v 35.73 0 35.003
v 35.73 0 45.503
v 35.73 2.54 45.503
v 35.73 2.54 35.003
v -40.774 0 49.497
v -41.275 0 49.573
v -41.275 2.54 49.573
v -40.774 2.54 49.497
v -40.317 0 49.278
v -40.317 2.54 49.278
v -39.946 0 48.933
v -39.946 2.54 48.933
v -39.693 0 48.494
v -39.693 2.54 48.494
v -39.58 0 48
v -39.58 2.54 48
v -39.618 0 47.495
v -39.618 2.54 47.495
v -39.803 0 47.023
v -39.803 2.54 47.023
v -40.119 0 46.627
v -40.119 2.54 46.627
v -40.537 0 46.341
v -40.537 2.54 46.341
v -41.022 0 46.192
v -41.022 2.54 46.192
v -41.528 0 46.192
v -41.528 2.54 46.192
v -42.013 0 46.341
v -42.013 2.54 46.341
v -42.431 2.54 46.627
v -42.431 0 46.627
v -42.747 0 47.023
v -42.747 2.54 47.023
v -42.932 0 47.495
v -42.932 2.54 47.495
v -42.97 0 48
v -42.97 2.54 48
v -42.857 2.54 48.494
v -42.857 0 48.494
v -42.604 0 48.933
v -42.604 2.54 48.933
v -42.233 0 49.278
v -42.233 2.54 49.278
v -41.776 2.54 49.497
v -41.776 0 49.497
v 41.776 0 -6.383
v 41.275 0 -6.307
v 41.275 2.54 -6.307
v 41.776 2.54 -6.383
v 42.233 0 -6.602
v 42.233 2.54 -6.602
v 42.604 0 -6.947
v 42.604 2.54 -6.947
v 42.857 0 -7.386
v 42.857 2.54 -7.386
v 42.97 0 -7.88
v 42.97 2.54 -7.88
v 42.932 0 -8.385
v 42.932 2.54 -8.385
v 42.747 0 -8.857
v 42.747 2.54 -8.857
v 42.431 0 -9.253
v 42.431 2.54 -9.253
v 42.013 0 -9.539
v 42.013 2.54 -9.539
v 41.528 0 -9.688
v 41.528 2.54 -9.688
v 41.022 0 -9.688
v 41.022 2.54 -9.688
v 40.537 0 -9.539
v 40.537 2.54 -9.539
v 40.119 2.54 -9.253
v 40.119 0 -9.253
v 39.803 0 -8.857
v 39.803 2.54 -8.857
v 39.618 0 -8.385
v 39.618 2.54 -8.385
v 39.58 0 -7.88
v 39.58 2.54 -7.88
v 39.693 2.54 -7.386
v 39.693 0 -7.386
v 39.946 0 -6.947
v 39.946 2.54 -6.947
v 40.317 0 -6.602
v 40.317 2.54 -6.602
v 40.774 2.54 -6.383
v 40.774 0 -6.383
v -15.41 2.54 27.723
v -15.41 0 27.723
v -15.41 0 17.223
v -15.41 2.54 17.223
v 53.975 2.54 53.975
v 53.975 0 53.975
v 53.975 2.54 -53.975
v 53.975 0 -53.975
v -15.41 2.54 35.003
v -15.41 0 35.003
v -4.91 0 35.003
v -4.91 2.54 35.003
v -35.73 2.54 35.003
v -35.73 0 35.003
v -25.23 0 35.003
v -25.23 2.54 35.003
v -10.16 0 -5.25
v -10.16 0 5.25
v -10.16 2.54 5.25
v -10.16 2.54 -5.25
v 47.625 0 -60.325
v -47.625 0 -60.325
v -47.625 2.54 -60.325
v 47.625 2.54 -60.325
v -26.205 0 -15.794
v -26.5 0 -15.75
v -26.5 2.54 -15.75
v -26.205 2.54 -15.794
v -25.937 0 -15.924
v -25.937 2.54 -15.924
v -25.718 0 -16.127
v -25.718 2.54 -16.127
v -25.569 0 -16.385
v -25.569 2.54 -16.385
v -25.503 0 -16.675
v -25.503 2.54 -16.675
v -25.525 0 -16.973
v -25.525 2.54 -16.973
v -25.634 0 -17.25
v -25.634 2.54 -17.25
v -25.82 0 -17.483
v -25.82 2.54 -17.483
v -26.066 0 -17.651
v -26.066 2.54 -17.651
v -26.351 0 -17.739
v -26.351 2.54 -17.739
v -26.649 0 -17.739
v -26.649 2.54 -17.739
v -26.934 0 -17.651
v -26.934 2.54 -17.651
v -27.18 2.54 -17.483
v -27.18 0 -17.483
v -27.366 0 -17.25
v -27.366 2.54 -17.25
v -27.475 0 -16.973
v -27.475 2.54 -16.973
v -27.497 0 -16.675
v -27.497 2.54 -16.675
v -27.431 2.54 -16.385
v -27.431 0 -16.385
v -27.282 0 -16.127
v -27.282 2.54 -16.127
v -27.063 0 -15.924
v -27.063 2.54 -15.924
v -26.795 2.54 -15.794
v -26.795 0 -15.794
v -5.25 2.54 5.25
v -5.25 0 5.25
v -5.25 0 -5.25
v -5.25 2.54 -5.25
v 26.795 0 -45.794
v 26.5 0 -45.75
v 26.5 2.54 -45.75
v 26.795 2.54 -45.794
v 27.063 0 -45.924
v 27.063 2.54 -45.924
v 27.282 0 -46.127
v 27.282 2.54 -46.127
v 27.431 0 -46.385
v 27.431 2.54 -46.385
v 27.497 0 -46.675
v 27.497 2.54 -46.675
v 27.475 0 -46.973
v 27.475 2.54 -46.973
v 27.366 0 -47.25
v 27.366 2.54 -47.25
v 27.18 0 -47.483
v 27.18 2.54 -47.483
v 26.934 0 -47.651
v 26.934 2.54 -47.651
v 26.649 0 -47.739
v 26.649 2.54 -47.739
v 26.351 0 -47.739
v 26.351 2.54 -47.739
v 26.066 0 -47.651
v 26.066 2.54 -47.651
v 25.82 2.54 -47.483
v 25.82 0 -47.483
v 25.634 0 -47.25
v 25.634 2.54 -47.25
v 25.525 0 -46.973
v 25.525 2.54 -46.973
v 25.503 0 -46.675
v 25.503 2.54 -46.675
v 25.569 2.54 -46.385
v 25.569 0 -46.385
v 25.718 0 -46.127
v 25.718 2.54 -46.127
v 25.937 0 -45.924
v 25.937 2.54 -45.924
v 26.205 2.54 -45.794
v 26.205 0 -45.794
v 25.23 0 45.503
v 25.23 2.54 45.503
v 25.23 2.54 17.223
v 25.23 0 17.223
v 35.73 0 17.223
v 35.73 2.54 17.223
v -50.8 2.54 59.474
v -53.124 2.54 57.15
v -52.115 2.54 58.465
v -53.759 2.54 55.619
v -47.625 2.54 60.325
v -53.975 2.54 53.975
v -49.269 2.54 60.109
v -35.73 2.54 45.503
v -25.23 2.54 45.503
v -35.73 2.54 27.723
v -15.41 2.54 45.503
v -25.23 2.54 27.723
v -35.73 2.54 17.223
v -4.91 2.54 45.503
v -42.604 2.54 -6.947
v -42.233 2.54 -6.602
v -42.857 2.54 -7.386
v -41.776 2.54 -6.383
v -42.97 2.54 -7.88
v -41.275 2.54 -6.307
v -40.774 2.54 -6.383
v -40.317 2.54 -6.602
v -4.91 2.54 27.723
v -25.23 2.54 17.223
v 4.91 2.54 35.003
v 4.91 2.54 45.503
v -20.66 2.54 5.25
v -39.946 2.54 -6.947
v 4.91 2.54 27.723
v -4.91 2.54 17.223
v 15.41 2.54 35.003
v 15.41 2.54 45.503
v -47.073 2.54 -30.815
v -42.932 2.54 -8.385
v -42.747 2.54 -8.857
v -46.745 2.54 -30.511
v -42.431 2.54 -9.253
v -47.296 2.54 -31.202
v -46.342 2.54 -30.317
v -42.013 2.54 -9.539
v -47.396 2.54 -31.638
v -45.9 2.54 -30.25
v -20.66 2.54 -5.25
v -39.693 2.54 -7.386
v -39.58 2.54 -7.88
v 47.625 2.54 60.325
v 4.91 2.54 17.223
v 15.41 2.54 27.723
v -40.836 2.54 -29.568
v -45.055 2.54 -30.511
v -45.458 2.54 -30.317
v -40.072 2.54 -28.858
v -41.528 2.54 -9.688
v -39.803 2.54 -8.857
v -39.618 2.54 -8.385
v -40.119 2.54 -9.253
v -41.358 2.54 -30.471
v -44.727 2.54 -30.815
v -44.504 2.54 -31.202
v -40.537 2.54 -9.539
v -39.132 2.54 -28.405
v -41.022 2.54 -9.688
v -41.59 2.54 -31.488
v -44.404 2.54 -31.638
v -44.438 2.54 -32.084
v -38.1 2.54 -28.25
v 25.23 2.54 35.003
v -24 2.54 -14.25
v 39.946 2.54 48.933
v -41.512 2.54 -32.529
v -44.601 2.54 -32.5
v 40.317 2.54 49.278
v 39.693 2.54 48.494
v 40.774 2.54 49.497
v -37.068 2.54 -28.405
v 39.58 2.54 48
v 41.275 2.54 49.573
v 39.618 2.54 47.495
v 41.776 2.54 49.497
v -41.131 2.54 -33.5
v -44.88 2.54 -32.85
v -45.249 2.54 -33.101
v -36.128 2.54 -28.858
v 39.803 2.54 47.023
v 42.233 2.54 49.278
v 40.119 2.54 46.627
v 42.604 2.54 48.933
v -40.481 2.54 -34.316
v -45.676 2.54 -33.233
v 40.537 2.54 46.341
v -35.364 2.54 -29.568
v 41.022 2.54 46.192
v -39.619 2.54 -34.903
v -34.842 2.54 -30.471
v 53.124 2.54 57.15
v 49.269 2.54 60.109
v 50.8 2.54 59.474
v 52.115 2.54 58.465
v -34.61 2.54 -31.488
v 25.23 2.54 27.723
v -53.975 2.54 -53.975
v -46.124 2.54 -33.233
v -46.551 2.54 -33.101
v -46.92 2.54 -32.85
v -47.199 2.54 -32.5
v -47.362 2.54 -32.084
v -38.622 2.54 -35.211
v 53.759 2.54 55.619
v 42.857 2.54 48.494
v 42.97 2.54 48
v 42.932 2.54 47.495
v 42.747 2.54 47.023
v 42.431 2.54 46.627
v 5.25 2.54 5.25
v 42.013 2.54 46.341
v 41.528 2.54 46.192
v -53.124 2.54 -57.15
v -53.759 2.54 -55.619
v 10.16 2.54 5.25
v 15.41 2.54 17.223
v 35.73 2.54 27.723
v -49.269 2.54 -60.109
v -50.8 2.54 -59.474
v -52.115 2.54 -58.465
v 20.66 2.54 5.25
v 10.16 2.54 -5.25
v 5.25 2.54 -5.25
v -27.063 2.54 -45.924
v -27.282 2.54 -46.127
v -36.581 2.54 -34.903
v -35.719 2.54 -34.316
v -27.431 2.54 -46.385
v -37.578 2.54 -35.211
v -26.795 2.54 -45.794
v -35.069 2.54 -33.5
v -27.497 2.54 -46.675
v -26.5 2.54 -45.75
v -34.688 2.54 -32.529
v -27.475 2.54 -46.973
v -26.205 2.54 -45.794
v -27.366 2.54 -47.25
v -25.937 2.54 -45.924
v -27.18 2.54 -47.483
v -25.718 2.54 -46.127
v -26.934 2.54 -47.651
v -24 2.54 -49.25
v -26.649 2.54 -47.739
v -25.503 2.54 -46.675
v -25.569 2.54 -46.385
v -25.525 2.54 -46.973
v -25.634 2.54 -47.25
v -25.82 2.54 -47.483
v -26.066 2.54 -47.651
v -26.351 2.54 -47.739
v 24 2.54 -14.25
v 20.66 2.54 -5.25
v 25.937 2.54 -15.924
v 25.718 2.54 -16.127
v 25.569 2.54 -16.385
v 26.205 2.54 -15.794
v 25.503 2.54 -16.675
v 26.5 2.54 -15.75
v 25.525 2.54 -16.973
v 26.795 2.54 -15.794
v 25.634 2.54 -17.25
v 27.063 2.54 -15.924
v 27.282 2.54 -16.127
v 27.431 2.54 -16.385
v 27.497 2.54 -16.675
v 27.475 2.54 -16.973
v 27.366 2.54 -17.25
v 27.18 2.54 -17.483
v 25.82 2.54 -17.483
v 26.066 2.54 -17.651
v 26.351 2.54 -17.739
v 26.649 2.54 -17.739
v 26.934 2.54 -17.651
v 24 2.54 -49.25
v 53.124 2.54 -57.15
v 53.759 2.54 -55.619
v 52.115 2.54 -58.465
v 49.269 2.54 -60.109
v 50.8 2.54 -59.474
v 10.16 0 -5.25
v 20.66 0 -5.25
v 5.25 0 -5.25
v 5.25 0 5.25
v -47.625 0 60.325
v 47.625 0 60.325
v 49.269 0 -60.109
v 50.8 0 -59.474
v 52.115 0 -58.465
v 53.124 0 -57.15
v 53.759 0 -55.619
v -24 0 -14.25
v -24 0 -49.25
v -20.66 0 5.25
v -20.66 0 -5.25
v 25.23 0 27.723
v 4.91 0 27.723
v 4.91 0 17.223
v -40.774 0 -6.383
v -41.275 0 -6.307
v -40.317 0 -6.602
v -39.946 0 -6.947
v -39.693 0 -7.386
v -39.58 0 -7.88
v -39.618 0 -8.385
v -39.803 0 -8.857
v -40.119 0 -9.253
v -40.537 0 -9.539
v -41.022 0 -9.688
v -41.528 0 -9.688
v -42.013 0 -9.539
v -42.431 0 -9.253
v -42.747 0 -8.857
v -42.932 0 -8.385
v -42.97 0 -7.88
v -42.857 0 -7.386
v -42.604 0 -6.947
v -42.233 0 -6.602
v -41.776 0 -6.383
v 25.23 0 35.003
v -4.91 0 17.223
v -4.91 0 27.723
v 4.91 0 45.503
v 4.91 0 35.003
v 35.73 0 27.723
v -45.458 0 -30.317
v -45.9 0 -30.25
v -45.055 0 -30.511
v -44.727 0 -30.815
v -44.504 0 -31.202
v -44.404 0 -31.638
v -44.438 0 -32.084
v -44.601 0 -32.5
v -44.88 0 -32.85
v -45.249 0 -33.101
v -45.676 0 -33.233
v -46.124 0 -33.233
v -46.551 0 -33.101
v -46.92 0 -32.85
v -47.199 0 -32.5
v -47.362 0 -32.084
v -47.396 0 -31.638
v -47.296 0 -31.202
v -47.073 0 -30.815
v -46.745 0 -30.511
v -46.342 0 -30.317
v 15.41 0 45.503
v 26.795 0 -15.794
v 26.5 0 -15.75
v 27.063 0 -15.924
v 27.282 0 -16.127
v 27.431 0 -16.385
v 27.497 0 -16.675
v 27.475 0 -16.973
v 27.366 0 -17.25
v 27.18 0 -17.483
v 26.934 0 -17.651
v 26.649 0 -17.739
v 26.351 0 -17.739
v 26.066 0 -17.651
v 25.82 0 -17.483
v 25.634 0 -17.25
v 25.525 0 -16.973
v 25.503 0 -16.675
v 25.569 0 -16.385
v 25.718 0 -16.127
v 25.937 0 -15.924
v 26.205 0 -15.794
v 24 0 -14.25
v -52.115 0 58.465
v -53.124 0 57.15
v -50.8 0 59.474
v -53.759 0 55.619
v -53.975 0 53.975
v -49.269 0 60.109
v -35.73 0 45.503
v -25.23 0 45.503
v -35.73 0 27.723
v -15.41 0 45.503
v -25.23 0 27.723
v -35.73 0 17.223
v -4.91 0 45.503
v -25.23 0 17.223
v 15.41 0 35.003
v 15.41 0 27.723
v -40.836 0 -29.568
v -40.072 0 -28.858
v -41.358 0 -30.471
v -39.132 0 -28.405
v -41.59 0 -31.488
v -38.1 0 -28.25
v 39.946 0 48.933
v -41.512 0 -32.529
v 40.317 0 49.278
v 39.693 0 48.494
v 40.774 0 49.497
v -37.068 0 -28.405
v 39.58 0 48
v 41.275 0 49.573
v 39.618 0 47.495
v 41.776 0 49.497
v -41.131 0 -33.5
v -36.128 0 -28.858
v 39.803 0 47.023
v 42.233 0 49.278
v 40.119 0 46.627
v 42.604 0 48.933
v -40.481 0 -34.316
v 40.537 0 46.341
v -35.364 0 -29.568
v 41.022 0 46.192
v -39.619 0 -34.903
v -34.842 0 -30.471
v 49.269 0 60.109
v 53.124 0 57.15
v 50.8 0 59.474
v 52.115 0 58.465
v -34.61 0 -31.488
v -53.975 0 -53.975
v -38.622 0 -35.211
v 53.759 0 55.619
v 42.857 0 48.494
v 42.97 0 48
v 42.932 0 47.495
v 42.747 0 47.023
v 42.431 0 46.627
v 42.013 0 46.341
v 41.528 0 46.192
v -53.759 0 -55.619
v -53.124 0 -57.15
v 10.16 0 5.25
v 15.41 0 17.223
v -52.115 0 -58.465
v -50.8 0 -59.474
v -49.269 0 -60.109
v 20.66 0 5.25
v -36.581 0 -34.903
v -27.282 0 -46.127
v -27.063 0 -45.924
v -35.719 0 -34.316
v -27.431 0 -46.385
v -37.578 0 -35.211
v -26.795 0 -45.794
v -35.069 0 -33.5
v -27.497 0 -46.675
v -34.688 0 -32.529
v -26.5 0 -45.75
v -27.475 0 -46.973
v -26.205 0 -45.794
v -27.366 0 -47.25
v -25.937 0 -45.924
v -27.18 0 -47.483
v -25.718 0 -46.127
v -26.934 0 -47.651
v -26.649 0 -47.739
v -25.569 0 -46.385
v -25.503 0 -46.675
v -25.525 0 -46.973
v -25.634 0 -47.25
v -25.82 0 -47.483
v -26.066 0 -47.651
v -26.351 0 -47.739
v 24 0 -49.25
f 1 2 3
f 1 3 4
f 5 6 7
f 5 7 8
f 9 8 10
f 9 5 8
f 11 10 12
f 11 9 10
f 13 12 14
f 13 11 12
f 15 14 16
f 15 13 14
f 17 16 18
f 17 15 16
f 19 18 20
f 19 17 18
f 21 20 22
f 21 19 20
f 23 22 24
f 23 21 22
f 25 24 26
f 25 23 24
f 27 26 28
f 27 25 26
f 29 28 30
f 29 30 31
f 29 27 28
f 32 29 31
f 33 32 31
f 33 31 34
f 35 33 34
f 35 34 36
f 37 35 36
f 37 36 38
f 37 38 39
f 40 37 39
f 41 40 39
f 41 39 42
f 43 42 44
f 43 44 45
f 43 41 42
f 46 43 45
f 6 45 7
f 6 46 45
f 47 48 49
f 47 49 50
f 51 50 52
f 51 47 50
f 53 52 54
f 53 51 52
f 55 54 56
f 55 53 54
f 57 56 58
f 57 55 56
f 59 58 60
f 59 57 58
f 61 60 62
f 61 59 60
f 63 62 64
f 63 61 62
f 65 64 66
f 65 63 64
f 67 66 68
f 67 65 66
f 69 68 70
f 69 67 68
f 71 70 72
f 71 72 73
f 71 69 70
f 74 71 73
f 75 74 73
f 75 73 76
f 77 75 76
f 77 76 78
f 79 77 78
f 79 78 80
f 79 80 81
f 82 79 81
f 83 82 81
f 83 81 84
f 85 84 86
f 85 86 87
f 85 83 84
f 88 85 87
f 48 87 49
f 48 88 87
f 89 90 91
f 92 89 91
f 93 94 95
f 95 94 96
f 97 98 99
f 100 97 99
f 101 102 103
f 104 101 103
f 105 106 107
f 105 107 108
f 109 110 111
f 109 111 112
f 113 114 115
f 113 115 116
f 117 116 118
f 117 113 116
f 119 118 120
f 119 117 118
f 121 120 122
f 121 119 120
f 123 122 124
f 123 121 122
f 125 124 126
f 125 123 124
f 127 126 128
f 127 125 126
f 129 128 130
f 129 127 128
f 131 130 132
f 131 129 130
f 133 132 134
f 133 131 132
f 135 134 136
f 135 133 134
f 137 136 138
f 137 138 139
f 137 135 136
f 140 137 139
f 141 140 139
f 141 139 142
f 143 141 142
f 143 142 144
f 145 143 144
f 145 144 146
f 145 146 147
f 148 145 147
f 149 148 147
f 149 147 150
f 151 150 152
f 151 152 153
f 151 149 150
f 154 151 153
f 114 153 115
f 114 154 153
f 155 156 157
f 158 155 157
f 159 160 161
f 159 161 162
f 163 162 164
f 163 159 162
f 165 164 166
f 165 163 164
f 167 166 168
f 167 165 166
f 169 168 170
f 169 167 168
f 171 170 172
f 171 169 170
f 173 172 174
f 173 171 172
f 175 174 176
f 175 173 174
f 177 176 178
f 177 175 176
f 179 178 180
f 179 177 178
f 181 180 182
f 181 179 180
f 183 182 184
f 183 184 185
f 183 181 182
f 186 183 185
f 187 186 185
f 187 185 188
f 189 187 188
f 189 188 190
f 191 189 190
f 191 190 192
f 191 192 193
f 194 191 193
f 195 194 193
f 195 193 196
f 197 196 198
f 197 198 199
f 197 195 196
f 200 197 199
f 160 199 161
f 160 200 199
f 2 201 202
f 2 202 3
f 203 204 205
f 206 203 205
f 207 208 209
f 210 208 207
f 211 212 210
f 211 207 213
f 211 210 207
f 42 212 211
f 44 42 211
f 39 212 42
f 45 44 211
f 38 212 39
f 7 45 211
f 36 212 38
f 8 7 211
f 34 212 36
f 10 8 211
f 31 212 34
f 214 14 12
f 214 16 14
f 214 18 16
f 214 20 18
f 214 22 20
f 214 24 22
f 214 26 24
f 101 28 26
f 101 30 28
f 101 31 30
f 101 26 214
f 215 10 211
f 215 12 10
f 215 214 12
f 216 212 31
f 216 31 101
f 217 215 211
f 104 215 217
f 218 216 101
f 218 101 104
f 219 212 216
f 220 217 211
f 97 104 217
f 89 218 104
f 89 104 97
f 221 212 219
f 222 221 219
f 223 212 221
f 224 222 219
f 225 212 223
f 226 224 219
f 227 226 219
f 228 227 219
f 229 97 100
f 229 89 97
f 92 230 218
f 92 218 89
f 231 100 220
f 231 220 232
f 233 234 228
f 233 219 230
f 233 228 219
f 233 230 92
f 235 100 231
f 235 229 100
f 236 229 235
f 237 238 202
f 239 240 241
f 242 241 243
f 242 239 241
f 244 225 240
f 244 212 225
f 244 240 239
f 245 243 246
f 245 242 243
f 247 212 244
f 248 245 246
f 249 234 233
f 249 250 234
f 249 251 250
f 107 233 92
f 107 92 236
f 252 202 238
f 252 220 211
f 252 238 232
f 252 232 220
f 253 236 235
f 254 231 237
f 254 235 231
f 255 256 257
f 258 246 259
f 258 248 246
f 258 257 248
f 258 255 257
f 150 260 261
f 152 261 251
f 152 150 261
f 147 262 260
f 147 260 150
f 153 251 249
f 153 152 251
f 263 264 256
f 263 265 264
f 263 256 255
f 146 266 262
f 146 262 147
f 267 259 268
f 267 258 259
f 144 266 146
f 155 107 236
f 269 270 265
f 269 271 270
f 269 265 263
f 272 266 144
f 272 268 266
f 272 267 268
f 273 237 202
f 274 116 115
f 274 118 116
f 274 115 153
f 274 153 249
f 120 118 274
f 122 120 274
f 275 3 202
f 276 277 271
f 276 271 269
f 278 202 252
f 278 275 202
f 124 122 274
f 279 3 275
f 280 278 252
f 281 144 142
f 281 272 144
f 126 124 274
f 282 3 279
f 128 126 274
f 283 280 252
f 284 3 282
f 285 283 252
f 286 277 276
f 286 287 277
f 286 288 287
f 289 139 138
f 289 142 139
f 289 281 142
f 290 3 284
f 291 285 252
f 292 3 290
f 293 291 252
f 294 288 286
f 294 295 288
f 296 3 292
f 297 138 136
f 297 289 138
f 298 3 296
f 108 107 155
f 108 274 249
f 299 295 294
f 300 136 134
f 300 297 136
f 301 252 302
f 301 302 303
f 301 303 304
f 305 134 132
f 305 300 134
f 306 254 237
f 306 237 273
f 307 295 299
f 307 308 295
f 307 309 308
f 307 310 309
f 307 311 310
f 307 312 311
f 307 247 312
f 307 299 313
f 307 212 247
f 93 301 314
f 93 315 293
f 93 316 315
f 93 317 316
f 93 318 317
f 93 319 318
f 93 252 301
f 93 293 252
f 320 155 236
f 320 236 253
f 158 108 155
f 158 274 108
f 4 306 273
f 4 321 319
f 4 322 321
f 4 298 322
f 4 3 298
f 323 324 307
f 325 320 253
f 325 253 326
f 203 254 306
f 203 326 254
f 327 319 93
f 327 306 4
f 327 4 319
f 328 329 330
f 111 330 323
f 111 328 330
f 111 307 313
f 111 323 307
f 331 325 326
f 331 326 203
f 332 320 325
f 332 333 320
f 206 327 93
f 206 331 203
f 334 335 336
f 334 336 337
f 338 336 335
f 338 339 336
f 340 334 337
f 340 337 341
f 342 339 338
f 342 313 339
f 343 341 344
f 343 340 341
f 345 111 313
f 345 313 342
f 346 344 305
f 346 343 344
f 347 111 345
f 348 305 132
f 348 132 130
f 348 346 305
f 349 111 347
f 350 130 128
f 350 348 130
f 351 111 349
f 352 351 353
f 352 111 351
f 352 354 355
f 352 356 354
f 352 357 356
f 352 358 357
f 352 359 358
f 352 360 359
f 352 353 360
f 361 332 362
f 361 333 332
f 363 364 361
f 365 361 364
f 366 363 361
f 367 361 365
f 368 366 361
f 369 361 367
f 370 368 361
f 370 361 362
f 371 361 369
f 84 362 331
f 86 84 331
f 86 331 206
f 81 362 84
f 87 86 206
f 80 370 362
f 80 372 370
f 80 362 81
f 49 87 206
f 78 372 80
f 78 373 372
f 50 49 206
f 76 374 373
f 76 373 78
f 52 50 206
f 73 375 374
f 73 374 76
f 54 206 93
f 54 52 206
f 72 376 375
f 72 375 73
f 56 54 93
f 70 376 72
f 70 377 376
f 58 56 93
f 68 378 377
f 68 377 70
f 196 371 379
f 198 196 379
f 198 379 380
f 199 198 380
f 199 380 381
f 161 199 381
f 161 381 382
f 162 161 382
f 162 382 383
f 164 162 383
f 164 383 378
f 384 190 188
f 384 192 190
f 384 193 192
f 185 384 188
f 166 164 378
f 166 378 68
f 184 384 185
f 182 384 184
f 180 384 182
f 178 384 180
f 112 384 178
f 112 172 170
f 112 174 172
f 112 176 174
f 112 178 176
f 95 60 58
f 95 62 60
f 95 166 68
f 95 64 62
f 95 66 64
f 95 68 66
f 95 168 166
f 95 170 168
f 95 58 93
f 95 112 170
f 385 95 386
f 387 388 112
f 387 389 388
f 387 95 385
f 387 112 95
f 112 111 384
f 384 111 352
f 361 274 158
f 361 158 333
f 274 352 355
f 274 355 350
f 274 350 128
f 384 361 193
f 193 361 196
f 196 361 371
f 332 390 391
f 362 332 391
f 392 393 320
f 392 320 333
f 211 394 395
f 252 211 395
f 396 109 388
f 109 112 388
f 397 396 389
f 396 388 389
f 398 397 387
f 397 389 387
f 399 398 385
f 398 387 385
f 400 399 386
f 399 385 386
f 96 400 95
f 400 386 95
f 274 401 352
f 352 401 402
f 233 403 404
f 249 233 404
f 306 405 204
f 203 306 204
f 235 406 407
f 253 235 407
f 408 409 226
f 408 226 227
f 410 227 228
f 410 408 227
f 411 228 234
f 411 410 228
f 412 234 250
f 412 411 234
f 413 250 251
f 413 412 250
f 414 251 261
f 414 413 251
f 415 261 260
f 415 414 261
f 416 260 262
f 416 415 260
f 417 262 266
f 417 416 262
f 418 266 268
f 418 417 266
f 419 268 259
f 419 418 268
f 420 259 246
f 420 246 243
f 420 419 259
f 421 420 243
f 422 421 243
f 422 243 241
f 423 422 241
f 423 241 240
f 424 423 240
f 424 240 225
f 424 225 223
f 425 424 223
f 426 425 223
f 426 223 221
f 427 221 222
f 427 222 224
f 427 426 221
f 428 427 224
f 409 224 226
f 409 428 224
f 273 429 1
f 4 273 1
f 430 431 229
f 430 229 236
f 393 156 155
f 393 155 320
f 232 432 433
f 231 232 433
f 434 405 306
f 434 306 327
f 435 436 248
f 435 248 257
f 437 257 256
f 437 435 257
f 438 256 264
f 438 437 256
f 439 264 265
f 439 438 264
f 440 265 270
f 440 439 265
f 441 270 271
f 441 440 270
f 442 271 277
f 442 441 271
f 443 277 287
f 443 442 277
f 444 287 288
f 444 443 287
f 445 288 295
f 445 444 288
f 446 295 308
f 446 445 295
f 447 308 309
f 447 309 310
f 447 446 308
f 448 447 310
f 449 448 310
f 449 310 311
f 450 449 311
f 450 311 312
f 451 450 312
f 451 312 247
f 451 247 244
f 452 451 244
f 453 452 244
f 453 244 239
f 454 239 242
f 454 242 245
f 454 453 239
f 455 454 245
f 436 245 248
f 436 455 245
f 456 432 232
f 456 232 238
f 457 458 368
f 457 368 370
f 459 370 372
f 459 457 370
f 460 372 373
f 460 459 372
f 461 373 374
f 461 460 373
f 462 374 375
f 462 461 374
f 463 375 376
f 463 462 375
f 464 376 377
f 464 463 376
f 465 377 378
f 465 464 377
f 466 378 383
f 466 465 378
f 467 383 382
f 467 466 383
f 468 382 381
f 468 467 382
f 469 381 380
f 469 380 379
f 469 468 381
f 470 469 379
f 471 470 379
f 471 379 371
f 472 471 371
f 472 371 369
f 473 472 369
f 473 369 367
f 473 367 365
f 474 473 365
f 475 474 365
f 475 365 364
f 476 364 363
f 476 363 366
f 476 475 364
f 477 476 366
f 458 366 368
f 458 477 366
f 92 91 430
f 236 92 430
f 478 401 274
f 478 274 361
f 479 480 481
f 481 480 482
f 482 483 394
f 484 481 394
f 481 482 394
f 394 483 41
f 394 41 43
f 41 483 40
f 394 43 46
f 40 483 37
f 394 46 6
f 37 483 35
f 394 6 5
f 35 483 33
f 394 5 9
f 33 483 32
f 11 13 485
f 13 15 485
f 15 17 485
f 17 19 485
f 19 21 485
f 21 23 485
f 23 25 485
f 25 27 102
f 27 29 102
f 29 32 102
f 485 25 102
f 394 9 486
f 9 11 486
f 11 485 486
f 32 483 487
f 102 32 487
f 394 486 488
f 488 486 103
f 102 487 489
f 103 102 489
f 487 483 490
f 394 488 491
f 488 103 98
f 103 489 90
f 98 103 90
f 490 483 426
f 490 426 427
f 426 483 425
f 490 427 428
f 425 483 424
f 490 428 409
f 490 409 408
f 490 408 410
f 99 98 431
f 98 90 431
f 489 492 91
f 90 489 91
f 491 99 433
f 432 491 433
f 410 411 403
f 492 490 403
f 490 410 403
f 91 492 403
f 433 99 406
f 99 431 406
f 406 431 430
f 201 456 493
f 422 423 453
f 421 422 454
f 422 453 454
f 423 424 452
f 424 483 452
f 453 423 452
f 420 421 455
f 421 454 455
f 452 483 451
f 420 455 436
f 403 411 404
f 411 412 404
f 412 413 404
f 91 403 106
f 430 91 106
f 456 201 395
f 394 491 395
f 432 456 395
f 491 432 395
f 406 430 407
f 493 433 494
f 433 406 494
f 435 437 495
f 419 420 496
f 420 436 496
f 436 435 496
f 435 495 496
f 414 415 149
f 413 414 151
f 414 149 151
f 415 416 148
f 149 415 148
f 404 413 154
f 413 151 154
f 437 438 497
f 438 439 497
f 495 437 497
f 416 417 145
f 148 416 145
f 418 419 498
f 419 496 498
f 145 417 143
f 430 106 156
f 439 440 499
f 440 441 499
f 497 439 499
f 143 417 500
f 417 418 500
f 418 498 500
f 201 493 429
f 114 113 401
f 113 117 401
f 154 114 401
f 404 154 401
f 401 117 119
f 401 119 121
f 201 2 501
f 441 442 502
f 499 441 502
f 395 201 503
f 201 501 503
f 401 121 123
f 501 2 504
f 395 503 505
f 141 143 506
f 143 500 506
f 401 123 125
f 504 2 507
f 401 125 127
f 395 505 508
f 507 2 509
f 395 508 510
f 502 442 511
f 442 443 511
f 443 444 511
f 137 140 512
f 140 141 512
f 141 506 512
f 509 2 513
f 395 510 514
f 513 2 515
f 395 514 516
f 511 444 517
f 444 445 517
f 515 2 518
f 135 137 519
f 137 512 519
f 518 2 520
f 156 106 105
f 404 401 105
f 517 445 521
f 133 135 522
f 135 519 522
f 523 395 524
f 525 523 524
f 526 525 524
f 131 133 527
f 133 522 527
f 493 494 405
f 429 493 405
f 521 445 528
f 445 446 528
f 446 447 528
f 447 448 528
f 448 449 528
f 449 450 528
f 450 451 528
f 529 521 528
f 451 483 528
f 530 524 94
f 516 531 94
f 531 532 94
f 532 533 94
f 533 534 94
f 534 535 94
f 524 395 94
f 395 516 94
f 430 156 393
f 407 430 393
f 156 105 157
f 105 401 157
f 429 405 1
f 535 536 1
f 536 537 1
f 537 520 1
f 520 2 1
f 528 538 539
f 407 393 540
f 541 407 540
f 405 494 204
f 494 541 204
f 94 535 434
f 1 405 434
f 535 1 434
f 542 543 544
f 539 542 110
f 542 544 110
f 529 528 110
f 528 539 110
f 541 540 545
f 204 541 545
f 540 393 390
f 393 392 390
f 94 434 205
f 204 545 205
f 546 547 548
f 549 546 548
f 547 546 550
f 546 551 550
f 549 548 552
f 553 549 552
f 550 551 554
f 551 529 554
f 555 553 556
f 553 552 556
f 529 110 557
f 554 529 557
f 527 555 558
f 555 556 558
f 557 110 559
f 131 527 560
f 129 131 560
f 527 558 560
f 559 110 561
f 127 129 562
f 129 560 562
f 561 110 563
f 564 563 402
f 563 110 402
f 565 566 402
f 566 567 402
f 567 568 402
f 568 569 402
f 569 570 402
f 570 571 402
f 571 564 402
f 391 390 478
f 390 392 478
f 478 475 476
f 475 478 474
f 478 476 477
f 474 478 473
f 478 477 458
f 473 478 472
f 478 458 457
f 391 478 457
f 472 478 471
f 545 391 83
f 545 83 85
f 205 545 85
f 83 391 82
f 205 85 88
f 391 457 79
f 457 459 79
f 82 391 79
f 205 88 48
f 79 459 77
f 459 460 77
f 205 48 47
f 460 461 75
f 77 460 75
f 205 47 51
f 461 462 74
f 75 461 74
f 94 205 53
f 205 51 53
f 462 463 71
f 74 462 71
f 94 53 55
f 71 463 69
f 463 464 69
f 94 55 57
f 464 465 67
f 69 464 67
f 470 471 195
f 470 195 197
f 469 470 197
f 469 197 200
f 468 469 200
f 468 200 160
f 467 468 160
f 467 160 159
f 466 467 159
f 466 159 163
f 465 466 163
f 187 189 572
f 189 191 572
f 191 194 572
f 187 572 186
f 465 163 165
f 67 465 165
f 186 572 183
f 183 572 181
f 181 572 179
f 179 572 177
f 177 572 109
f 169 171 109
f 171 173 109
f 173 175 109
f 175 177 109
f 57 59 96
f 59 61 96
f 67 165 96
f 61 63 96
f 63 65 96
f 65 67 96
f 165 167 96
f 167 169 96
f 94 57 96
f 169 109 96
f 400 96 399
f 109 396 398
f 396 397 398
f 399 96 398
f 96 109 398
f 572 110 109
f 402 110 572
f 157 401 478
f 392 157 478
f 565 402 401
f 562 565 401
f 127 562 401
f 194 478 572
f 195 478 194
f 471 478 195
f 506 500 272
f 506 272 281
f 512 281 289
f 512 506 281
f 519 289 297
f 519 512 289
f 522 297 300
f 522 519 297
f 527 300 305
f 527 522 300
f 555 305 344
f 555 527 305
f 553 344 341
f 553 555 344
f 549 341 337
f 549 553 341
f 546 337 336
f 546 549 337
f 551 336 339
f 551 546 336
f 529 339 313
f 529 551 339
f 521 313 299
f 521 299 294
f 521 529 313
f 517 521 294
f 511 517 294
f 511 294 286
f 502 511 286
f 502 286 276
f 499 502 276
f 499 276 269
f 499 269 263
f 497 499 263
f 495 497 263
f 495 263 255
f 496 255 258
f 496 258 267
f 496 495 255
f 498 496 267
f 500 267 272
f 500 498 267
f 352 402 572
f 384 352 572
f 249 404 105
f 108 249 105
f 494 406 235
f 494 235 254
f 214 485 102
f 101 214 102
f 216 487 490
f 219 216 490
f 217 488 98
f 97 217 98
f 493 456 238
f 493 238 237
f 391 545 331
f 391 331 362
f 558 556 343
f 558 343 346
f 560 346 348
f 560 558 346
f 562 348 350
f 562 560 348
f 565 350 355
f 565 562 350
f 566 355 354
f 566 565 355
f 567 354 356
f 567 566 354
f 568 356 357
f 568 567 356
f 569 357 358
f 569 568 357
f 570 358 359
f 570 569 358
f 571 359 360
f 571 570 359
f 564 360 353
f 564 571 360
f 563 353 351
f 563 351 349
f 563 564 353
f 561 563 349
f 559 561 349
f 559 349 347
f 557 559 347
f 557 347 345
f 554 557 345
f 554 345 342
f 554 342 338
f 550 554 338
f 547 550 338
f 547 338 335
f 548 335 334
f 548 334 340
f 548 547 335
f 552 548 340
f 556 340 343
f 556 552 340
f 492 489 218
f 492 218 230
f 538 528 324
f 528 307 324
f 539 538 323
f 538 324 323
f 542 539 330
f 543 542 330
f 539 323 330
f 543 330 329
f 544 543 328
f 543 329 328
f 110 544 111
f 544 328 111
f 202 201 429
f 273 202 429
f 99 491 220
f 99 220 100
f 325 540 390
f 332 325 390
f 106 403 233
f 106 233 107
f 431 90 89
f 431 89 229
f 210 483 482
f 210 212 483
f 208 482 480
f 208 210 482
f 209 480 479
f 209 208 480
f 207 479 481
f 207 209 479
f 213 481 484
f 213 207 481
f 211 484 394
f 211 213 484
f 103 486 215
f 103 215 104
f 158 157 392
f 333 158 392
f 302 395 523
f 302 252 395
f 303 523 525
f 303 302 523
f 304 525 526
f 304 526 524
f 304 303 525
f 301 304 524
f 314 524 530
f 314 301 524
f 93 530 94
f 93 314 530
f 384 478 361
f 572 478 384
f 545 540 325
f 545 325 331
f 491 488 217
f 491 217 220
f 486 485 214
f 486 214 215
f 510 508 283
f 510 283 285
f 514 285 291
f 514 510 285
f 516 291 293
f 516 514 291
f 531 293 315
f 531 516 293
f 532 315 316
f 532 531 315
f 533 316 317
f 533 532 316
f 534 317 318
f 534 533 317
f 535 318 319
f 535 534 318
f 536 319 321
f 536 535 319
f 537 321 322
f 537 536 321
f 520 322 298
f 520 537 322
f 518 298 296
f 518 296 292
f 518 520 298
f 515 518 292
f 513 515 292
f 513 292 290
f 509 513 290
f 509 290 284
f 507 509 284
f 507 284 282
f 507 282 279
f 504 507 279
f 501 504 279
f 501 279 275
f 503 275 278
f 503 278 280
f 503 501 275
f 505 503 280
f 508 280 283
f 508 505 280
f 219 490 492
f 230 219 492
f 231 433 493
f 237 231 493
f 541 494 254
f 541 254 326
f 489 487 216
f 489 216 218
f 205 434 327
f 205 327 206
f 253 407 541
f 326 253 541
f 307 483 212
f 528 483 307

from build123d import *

# Parameters (mm, degrees)
SKETCH1_W           = 107.95
SKETCH1_H           = 120.65
SKETCH1_R           = 3.5
SKETCH1_R_2         = 1
SKETCH1_R_3         = 1.5
SKETCH1_R_4         = 1.6999966
SKETCH1_W_2         = 48
SKETCH1_H_2         = 35
SKETCH1_W_3         = 10.5
SKETCH1_H_3         = 10.5
BOSS_EXTRUDE1_DEPTH = 2.54
FILLET1_R           = 6.35


with BuildPart() as part:
    # Sketch1 → Boss-Extrude1 (new body)
    with BuildSketch(Plane(origin=(0, 0, 0), x_dir=(1, 0, 0), z_dir=(0, 1, 0))):
        Rectangle(SKETCH1_W, SKETCH1_H)
        with Locations(Location((-38.1, 31.75, 0), (0, 0, 270))):
            Circle(SKETCH1_R, mode=Mode.SUBTRACT)
        with Locations(Location((-26.5, 46.75, 0), (0, 0, 270))):
            Circle(SKETCH1_R_2, mode=Mode.SUBTRACT)
        with Locations(Location((26.5, 46.75, 0), (0, 0, 270))):
            Circle(SKETCH1_R_2, mode=Mode.SUBTRACT)
        with Locations(Location((26.5, 16.75, 0), (0, 0, 270))):
            Circle(SKETCH1_R_2, mode=Mode.SUBTRACT)
        with Locations(Location((-26.5, 16.75, 0), (0, 0, 270))):
            Circle(SKETCH1_R_2, mode=Mode.SUBTRACT)
        with Locations(Location((-45.9, 31.75, 0), (0, 0, 270))):
            Circle(SKETCH1_R_3, mode=Mode.SUBTRACT)
        with Locations(Location((-41.275, 8.007058824, 0), (0, 0, 270))):
            Circle(SKETCH1_R_4, mode=Mode.SUBTRACT)
        with Locations(Location((41.275, 8.007058824, 0), (0, 0, 270))):
            Circle(SKETCH1_R_4, mode=Mode.SUBTRACT)
        with Locations(Location((41.275, -47.872941176, 0), (0, 0, 270))):
            Circle(SKETCH1_R_4, mode=Mode.SUBTRACT)
        with Locations(Location((-41.275, -47.872941176, 0), (0, 0, 270))):
            Circle(SKETCH1_R_4, mode=Mode.SUBTRACT)
        with Locations((0, 31.75)):
            Rectangle(SKETCH1_W_2, SKETCH1_H_2, mode=Mode.SUBTRACT)
        with Locations((30.48, -40.252941176)):
            Rectangle(SKETCH1_W_3, SKETCH1_H_3, mode=Mode.SUBTRACT)
        with Locations((-30.48, -22.472941176)):
            Rectangle(SKETCH1_W_3, SKETCH1_H_3, mode=Mode.SUBTRACT)
        with Locations((-10.16, -22.472941176)):
            Rectangle(SKETCH1_W_3, SKETCH1_H_3, mode=Mode.SUBTRACT)
        with Locations((10.16, -22.472941176)):
            Rectangle(SKETCH1_W_3, SKETCH1_H_3, mode=Mode.SUBTRACT)
        with Locations((30.48, -22.472941176)):
            Rectangle(SKETCH1_W_3, SKETCH1_H_3, mode=Mode.SUBTRACT)
        with Locations((10.16, -40.252941176)):
            Rectangle(SKETCH1_W_3, SKETCH1_H_3, mode=Mode.SUBTRACT)
        with Locations((-10.16, -40.252941176)):
            Rectangle(SKETCH1_W_3, SKETCH1_H_3, mode=Mode.SUBTRACT)
        with Locations((-30.48, -40.252941176)):
            Rectangle(SKETCH1_W_3, SKETCH1_H_3, mode=Mode.SUBTRACT)
        Rectangle(SKETCH1_W_3, SKETCH1_H_3, mode=Mode.SUBTRACT)
        with Locations((-15.41, 0)):
            Rectangle(SKETCH1_W_3, SKETCH1_H_3, mode=Mode.SUBTRACT)
        with Locations((15.41, 0)):
            Rectangle(SKETCH1_W_3, SKETCH1_H_3, mode=Mode.SUBTRACT)
    extrude(amount=BOSS_EXTRUDE1_DEPTH)

    # Fillet1
    fillet1_edges = [part.edges().sort_by_distance(p)[0] for p in [
        (53.975, 1.27, 60.325),
        (-53.975, 1.27, 60.325),
        (-53.975, 1.27, -60.325),
        (53.975, 1.27, -60.325),
    ]]
    fillet(fillet1_edges, radius=FILLET1_R)


solid = part.part
